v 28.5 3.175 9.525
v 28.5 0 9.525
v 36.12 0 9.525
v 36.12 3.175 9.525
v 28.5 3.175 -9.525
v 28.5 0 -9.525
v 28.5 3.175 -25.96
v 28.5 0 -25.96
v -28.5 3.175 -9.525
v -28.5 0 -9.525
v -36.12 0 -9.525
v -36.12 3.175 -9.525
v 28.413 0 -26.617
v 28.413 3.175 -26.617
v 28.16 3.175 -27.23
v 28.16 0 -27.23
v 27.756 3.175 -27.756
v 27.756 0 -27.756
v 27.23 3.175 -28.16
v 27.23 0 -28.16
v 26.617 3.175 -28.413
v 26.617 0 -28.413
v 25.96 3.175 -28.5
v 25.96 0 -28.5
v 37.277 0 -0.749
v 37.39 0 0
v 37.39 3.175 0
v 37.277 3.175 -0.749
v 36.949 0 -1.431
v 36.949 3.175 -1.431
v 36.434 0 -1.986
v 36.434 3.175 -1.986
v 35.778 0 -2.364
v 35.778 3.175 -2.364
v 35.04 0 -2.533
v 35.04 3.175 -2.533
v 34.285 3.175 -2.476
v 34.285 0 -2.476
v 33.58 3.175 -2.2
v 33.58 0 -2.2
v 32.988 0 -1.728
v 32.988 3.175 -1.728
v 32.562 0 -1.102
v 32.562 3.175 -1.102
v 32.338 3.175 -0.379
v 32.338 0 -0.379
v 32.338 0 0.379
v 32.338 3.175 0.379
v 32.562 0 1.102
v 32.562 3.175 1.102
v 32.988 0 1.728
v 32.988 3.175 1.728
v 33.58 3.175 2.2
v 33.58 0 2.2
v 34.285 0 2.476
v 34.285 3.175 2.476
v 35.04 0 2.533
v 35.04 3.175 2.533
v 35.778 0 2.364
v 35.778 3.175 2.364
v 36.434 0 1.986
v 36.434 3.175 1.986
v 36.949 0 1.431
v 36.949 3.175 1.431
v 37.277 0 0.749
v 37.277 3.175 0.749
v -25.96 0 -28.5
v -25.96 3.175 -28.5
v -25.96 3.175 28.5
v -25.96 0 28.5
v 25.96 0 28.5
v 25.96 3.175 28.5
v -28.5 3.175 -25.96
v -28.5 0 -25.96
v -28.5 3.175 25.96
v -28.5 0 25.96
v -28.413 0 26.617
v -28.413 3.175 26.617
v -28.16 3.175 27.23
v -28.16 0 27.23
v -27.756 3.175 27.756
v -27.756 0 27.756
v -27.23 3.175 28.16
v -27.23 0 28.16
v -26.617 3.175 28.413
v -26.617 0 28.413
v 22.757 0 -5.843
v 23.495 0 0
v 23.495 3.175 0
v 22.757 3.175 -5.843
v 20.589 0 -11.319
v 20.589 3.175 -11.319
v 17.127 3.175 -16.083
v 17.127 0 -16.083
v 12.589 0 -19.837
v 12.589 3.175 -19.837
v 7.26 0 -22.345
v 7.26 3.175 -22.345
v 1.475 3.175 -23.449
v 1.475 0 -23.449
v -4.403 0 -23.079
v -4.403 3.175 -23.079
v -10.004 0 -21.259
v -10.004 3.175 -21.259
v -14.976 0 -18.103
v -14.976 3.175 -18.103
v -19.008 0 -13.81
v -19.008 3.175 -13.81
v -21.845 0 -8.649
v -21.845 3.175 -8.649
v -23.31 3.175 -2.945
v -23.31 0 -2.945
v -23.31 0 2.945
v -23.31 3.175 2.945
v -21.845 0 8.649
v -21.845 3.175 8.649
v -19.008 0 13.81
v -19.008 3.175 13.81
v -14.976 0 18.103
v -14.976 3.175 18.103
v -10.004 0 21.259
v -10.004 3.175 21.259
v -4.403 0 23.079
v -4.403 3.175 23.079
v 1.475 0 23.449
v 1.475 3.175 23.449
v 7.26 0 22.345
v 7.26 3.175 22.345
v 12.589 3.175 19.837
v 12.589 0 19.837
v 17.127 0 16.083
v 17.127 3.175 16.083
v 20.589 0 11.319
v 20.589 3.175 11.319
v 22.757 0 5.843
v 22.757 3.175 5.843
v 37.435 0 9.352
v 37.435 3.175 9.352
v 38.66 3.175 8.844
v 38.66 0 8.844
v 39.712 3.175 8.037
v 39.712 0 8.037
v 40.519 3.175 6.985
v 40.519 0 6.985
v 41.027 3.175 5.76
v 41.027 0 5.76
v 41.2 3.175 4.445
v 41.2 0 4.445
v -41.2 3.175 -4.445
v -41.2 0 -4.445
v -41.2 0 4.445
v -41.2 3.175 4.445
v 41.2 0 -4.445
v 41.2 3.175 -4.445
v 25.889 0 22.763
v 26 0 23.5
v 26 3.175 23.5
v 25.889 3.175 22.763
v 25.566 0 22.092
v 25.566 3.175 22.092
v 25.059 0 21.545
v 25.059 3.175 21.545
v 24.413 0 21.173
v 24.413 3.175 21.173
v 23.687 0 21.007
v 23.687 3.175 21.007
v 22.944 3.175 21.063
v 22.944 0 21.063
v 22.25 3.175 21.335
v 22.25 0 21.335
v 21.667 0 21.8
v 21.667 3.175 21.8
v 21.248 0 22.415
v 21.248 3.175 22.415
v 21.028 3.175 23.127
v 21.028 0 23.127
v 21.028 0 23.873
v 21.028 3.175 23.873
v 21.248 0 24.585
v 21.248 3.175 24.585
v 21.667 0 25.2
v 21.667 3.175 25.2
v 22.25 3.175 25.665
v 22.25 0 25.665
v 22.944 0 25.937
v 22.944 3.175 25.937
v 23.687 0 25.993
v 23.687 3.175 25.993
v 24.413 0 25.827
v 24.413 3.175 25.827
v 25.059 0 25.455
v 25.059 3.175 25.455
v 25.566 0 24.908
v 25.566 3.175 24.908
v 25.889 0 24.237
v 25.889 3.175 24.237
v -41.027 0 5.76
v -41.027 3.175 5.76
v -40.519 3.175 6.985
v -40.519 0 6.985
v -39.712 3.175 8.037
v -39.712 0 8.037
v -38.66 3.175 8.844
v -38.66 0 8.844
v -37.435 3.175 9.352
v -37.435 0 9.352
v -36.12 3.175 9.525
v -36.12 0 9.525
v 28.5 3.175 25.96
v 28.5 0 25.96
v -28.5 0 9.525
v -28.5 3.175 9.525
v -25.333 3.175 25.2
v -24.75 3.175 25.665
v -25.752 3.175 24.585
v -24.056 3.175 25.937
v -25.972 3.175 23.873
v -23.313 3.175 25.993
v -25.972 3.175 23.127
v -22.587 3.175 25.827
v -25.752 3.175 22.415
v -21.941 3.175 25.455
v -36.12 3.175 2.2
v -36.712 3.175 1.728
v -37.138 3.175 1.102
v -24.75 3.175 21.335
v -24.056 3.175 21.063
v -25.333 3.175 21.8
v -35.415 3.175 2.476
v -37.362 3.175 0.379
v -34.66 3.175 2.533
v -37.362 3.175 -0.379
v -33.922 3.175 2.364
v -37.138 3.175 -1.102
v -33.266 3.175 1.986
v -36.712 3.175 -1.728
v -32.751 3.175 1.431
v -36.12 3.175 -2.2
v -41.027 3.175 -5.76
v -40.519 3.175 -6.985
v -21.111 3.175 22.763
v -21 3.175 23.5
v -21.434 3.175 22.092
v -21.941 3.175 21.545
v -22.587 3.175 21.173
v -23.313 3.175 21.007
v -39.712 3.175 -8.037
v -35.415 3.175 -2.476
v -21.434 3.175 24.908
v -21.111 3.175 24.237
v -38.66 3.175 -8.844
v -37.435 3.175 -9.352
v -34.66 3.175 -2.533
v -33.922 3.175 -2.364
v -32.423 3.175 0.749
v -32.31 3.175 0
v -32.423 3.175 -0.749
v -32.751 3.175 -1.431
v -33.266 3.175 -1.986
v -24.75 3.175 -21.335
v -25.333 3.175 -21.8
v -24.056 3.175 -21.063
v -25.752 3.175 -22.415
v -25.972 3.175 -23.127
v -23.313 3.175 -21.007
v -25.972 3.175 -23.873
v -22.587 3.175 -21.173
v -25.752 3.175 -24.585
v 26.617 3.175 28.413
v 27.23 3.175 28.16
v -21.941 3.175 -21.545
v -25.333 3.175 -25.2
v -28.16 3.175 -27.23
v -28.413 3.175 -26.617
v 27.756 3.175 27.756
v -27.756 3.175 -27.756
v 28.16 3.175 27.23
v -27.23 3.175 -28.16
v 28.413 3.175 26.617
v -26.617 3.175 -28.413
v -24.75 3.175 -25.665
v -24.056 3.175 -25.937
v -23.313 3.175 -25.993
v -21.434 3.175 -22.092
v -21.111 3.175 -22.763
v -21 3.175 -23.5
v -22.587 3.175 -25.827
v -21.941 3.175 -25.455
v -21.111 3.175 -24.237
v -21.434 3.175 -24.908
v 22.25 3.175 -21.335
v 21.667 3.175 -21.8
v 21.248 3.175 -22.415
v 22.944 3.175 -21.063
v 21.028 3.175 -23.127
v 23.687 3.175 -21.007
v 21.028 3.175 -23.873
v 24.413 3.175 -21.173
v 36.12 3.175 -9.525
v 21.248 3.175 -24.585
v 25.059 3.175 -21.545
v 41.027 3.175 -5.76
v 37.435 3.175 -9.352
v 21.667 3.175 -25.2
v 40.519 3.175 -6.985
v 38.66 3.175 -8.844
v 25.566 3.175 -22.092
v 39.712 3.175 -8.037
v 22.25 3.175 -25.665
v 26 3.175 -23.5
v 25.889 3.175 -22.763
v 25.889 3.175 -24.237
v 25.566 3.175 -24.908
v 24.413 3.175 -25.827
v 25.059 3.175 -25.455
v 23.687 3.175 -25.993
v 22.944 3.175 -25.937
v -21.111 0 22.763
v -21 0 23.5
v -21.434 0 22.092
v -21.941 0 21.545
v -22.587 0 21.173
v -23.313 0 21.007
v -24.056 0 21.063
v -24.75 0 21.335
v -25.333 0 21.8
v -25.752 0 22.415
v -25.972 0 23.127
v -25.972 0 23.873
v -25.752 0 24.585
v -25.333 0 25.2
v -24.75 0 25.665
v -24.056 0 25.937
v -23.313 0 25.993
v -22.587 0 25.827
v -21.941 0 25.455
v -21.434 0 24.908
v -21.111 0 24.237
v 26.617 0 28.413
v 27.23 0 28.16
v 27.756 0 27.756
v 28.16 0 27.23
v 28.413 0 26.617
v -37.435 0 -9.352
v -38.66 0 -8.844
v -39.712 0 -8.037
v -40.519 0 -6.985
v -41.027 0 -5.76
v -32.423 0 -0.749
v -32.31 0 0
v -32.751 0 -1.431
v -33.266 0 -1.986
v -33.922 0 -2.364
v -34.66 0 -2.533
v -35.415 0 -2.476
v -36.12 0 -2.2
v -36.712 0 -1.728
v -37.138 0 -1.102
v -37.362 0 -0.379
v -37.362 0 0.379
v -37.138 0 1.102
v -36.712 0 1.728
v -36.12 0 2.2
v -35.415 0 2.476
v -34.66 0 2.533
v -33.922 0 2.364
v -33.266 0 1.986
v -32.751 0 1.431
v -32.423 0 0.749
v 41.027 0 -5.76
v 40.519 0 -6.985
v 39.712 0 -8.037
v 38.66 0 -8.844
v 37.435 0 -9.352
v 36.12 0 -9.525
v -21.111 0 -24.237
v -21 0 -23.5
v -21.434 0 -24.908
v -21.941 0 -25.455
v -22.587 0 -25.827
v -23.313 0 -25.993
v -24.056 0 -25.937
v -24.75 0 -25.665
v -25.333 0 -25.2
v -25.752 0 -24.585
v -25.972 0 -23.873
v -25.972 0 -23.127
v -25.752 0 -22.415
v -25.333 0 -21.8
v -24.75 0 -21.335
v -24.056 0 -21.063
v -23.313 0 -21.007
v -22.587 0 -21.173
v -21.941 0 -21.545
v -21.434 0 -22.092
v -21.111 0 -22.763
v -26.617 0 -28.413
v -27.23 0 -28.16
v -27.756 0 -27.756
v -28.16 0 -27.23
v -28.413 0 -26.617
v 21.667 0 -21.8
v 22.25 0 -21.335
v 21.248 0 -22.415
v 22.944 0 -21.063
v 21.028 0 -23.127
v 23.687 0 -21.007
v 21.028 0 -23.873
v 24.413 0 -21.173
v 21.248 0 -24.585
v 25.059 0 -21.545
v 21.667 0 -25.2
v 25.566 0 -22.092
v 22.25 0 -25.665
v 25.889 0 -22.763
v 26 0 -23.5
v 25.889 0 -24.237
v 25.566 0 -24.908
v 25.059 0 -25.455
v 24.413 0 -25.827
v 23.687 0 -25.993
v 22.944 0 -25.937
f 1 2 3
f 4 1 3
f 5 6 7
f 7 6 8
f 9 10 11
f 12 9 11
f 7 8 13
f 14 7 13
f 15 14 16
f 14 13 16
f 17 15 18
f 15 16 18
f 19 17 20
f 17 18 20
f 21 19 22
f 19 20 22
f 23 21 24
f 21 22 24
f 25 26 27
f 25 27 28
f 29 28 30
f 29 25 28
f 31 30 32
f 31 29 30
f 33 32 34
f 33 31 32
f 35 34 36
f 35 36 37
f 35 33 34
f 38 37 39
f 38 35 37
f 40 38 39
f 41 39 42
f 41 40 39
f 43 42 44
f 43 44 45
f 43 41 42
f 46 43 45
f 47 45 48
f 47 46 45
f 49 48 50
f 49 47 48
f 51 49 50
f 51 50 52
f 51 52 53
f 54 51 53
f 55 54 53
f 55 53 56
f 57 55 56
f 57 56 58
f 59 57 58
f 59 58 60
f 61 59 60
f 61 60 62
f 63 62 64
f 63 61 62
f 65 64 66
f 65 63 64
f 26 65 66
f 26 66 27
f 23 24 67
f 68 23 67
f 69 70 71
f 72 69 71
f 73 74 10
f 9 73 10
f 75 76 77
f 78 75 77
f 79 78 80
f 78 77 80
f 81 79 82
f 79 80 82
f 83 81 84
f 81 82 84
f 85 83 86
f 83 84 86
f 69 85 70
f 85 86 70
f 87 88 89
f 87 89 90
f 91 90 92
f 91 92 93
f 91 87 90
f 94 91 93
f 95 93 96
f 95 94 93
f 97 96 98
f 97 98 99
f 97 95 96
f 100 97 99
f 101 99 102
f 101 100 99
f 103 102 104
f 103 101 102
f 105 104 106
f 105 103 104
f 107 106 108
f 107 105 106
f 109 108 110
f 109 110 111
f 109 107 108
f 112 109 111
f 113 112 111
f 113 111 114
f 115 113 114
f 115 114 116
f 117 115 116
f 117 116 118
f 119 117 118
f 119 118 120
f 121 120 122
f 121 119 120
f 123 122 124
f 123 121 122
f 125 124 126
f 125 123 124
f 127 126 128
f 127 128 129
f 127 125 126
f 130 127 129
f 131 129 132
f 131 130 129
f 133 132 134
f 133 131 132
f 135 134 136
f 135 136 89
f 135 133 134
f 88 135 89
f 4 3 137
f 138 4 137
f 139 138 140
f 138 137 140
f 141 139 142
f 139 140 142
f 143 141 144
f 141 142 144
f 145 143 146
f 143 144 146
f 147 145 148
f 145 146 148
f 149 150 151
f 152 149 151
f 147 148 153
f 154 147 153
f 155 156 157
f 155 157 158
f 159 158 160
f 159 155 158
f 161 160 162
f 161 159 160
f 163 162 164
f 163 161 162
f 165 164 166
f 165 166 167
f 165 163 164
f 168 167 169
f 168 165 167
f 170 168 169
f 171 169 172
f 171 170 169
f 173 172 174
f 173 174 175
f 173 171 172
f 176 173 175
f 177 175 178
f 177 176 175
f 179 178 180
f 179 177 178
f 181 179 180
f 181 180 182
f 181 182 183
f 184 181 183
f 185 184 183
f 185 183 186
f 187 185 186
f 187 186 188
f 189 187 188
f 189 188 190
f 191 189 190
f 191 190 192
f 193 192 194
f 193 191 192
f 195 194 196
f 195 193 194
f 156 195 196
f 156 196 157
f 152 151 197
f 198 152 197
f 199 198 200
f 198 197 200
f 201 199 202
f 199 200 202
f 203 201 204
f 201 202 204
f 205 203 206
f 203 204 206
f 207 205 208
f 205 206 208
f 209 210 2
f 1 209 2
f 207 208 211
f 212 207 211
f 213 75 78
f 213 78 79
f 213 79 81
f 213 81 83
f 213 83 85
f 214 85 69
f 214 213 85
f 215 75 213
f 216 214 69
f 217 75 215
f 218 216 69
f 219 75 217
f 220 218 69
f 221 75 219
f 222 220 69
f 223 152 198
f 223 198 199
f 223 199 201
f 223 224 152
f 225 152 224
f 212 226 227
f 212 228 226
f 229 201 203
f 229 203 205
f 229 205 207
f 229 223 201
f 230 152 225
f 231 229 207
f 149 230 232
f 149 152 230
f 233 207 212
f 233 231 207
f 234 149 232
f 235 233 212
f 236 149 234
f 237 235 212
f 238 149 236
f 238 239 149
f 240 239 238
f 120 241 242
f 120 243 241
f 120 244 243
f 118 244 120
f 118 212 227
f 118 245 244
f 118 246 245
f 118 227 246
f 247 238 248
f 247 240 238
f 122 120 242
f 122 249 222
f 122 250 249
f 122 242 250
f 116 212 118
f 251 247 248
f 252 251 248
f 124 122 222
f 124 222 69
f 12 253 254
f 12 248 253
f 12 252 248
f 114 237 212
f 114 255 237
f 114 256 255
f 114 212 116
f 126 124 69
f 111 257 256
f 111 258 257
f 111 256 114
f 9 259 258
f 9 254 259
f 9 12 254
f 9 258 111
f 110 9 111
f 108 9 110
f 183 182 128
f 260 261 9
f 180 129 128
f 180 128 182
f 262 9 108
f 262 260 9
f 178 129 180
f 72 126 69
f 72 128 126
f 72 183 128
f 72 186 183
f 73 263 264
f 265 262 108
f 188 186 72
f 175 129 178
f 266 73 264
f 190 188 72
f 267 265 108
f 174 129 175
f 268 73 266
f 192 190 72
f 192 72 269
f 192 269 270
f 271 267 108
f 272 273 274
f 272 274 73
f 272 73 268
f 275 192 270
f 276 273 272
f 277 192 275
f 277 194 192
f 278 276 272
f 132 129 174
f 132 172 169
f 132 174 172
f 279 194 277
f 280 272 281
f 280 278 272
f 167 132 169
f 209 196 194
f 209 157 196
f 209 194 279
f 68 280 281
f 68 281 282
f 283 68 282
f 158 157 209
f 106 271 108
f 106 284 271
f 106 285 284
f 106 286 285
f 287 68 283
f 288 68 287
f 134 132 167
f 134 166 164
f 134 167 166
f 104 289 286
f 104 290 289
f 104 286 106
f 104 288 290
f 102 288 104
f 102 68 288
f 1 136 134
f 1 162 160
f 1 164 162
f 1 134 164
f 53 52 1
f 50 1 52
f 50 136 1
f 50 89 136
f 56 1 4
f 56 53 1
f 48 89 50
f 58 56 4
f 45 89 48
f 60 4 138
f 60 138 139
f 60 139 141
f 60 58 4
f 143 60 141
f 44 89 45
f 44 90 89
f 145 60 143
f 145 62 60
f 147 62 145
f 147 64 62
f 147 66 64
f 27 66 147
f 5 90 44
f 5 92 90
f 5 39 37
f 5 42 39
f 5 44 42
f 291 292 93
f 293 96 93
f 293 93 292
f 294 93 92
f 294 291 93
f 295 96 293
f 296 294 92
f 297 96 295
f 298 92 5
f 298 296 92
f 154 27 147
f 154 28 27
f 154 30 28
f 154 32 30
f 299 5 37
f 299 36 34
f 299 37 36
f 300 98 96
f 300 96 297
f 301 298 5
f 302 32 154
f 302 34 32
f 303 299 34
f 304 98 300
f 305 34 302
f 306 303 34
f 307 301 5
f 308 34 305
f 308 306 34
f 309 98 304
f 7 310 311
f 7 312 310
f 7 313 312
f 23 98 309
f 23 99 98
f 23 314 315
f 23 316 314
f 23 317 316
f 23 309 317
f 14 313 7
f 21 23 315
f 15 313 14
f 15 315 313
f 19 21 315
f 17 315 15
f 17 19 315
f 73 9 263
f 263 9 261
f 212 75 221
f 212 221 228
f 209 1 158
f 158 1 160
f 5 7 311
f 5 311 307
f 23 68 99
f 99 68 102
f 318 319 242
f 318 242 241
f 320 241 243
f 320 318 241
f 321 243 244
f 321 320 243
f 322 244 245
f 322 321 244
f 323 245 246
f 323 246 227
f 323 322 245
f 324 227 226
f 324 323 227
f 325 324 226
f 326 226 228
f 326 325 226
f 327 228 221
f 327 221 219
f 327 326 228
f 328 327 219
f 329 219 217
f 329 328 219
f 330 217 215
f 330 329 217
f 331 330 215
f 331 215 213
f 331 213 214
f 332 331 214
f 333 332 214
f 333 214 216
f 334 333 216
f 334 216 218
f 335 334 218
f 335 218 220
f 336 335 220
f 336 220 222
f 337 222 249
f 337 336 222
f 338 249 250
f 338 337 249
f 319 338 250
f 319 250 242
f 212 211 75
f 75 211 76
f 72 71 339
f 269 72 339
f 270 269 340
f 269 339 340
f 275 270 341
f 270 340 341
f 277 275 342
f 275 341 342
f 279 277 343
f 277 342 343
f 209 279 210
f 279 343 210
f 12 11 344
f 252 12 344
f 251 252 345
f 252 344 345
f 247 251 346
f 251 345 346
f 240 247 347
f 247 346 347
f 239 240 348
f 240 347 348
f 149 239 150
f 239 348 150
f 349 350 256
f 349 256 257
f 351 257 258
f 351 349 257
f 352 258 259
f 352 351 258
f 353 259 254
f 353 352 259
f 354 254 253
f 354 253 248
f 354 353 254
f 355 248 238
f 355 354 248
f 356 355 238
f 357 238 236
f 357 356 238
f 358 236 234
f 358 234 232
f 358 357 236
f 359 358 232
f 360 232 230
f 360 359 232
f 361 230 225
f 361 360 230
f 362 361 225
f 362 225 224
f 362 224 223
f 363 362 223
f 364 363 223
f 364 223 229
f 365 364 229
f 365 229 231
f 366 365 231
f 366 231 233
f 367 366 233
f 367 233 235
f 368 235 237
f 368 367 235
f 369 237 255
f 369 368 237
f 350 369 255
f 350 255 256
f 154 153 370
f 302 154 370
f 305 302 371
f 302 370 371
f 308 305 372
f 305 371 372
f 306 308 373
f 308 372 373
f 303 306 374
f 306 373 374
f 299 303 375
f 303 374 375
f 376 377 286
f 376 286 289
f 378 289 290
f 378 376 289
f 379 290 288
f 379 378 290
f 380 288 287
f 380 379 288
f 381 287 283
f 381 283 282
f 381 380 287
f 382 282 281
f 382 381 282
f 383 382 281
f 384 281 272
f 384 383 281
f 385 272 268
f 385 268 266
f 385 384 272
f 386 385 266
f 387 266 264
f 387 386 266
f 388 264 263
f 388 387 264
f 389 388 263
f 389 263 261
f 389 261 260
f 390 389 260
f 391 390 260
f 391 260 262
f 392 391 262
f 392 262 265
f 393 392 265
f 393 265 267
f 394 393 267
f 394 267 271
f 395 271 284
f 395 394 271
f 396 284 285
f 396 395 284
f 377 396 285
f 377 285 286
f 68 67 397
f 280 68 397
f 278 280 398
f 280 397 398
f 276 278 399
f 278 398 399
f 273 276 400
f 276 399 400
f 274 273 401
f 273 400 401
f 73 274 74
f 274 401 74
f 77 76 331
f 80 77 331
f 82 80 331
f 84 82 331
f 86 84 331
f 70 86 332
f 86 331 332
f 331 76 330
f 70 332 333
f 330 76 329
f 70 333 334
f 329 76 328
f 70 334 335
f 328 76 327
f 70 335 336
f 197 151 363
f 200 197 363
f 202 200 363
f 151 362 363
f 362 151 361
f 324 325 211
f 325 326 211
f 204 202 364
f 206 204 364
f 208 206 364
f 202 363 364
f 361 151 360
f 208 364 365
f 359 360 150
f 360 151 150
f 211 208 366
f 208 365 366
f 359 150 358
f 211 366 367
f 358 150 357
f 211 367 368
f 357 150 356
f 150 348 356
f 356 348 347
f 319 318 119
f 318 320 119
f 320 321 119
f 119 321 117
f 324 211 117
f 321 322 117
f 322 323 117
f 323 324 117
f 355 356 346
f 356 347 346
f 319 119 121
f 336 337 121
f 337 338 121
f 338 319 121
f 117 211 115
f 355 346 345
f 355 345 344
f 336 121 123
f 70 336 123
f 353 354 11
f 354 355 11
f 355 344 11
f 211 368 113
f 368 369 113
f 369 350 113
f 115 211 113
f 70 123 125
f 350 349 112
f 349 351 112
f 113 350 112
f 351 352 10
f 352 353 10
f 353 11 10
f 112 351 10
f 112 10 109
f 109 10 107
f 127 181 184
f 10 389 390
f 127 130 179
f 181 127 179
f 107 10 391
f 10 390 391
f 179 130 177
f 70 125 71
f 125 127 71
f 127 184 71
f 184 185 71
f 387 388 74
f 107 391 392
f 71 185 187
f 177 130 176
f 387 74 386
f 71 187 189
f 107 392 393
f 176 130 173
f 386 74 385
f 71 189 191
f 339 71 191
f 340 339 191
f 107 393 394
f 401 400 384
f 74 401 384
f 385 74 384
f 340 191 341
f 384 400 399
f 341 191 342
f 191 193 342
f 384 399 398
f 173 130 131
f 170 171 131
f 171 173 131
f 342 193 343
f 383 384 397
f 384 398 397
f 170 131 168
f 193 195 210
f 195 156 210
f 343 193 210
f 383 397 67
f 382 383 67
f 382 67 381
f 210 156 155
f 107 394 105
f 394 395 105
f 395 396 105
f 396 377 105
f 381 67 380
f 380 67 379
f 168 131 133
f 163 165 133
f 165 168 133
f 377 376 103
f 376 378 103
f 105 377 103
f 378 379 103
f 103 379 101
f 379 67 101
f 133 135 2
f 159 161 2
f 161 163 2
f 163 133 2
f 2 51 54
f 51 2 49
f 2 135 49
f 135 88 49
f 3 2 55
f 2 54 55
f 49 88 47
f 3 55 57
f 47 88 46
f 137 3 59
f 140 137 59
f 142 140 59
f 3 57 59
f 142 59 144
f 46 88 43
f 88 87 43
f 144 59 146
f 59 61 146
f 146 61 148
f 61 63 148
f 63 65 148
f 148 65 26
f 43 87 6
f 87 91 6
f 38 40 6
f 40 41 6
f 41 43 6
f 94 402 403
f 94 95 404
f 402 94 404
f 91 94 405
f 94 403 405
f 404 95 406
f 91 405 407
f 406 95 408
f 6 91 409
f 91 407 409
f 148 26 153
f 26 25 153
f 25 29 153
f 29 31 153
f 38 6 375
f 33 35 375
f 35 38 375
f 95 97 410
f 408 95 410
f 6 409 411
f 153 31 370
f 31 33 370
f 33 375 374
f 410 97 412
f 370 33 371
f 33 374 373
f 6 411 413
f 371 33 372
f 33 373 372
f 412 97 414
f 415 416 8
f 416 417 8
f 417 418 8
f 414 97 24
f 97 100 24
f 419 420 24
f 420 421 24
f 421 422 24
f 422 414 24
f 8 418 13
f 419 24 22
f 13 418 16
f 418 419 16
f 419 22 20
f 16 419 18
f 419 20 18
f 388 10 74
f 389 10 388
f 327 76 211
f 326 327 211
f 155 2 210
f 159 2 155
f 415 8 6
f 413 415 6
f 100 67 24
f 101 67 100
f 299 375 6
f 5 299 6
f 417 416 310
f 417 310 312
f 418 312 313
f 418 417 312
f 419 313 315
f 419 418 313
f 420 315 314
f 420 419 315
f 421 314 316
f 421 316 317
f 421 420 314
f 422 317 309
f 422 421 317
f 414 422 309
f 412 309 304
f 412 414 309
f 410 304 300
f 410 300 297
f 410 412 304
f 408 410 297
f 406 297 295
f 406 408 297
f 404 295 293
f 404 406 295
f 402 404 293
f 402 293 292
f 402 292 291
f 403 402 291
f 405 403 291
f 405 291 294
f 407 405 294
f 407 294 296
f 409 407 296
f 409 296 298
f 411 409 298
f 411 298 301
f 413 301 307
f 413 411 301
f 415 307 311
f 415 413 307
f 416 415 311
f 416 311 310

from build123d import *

# Parameters (mm, degrees)
SKETCH1_R           = 23.495
SKETCH1_R_2         = 2.499995
SKETCH1_R_3         = 2.54
BOSS_EXTRUDE1_DEPTH = 3.175


with BuildPart() as part:
    # Sketch1 → Boss-Extrude1 (new body)
    with BuildSketch(Plane(origin=(0, 0, 0), x_dir=(1, 0, 0), z_dir=(0, 1, 0))):
        with BuildLine():
            Line((-13.993314597, 28.4999938), (-25.9599938, 28.4999938))
            ThreePointArc((-25.9599938, 28.4999938), (-27.756045024, 27.756045024), (-28.4999938, 25.9599938))
            Line((-28.4999938, 25.9599938), (-28.4999938, 13.993314597))
            Line((-28.4999938, 13.993314597), (-28.4999938, 9.525))
            Line((-28.4999938, 9.525), (-36.1199938, 9.525))
            ThreePointArc((-36.1199938, 9.525), (-39.712096248, 8.037102448), (-41.1999938, 4.445))
            Line((-41.1999938, 4.445), (-41.1999938, -4.445))
            ThreePointArc((-41.1999938, -4.445), (-39.712096248, -8.037102448), (-36.1199938, -9.525))
            Line((-36.1199938, -9.525), (-28.4999938, -9.525))
            Line((-28.4999938, -9.525), (-28.4999938, -13.993314597))
            Line((-28.4999938, -13.993314597), (-28.4999938, -25.9599938))
            ThreePointArc((-28.4999938, -25.9599938), (-27.756045024, -27.756045024), (-25.9599938, -28.4999938))
            Line((-25.9599938, -28.4999938), (-13.993314597, -28.4999938))
            Line((-13.993314597, -28.4999938), (13.993314597, -28.4999938))
            Line((13.993314597, -28.4999938), (25.9599938, -28.4999938))
            ThreePointArc((25.9599938, -28.4999938), (27.756045024, -27.756045024), (28.4999938, -25.9599938))
            Line((28.4999938, -25.9599938), (28.4999938, -13.993314597))
            Line((28.4999938, -13.993314597), (28.4999938, -9.525))
            Line((28.4999938, -9.525), (36.1199938, -9.525))
            ThreePointArc((36.1199938, -9.525), (39.712096248, -8.037102448), (41.1999938, -4.445))
            Line((41.1999938, -4.445), (41.1999938, 4.445))
            ThreePointArc((41.1999938, 4.445), (39.712096248, 8.037102448), (36.1199938, 9.525))
            Line((36.1199938, 9.525), (28.4999938, 9.525))
            Line((28.4999938, 9.525), (28.4999938, 13.993314597))
            Line((28.4999938, 13.993314597), (28.4999938, 25.9599938))
            ThreePointArc((28.4999938, 25.9599938), (27.756045024, 27.756045024), (25.9599938, 28.4999938))
            Line((25.9599938, 28.4999938), (13.993314597, 28.4999938))
            Line((13.993314597, 28.4999938), (-13.993314597, 28.4999938))
        make_face()
        Circle(SKETCH1_R, mode=Mode.SUBTRACT)
        with Locations((-23.5000038, 23.5000038)):
            Circle(SKETCH1_R_2, mode=Mode.SUBTRACT)
        with Locations((23.5000038, 23.5000038)):
            Circle(SKETCH1_R_2, mode=Mode.SUBTRACT)
        with Locations((23.5000038, -23.5000038)):
            Circle(SKETCH1_R_2, mode=Mode.SUBTRACT)
        with Locations((-23.5000038, -23.5000038)):
            Circle(SKETCH1_R_2, mode=Mode.SUBTRACT)
        with Locations((-34.8499938, 0)):
            Circle(SKETCH1_R_3, mode=Mode.SUBTRACT)
        with Locations((34.8499938, 0)):
            Circle(SKETCH1_R_3, mode=Mode.SUBTRACT)
    extrude(amount=BOSS_EXTRUDE1_DEPTH)


solid = part.part
